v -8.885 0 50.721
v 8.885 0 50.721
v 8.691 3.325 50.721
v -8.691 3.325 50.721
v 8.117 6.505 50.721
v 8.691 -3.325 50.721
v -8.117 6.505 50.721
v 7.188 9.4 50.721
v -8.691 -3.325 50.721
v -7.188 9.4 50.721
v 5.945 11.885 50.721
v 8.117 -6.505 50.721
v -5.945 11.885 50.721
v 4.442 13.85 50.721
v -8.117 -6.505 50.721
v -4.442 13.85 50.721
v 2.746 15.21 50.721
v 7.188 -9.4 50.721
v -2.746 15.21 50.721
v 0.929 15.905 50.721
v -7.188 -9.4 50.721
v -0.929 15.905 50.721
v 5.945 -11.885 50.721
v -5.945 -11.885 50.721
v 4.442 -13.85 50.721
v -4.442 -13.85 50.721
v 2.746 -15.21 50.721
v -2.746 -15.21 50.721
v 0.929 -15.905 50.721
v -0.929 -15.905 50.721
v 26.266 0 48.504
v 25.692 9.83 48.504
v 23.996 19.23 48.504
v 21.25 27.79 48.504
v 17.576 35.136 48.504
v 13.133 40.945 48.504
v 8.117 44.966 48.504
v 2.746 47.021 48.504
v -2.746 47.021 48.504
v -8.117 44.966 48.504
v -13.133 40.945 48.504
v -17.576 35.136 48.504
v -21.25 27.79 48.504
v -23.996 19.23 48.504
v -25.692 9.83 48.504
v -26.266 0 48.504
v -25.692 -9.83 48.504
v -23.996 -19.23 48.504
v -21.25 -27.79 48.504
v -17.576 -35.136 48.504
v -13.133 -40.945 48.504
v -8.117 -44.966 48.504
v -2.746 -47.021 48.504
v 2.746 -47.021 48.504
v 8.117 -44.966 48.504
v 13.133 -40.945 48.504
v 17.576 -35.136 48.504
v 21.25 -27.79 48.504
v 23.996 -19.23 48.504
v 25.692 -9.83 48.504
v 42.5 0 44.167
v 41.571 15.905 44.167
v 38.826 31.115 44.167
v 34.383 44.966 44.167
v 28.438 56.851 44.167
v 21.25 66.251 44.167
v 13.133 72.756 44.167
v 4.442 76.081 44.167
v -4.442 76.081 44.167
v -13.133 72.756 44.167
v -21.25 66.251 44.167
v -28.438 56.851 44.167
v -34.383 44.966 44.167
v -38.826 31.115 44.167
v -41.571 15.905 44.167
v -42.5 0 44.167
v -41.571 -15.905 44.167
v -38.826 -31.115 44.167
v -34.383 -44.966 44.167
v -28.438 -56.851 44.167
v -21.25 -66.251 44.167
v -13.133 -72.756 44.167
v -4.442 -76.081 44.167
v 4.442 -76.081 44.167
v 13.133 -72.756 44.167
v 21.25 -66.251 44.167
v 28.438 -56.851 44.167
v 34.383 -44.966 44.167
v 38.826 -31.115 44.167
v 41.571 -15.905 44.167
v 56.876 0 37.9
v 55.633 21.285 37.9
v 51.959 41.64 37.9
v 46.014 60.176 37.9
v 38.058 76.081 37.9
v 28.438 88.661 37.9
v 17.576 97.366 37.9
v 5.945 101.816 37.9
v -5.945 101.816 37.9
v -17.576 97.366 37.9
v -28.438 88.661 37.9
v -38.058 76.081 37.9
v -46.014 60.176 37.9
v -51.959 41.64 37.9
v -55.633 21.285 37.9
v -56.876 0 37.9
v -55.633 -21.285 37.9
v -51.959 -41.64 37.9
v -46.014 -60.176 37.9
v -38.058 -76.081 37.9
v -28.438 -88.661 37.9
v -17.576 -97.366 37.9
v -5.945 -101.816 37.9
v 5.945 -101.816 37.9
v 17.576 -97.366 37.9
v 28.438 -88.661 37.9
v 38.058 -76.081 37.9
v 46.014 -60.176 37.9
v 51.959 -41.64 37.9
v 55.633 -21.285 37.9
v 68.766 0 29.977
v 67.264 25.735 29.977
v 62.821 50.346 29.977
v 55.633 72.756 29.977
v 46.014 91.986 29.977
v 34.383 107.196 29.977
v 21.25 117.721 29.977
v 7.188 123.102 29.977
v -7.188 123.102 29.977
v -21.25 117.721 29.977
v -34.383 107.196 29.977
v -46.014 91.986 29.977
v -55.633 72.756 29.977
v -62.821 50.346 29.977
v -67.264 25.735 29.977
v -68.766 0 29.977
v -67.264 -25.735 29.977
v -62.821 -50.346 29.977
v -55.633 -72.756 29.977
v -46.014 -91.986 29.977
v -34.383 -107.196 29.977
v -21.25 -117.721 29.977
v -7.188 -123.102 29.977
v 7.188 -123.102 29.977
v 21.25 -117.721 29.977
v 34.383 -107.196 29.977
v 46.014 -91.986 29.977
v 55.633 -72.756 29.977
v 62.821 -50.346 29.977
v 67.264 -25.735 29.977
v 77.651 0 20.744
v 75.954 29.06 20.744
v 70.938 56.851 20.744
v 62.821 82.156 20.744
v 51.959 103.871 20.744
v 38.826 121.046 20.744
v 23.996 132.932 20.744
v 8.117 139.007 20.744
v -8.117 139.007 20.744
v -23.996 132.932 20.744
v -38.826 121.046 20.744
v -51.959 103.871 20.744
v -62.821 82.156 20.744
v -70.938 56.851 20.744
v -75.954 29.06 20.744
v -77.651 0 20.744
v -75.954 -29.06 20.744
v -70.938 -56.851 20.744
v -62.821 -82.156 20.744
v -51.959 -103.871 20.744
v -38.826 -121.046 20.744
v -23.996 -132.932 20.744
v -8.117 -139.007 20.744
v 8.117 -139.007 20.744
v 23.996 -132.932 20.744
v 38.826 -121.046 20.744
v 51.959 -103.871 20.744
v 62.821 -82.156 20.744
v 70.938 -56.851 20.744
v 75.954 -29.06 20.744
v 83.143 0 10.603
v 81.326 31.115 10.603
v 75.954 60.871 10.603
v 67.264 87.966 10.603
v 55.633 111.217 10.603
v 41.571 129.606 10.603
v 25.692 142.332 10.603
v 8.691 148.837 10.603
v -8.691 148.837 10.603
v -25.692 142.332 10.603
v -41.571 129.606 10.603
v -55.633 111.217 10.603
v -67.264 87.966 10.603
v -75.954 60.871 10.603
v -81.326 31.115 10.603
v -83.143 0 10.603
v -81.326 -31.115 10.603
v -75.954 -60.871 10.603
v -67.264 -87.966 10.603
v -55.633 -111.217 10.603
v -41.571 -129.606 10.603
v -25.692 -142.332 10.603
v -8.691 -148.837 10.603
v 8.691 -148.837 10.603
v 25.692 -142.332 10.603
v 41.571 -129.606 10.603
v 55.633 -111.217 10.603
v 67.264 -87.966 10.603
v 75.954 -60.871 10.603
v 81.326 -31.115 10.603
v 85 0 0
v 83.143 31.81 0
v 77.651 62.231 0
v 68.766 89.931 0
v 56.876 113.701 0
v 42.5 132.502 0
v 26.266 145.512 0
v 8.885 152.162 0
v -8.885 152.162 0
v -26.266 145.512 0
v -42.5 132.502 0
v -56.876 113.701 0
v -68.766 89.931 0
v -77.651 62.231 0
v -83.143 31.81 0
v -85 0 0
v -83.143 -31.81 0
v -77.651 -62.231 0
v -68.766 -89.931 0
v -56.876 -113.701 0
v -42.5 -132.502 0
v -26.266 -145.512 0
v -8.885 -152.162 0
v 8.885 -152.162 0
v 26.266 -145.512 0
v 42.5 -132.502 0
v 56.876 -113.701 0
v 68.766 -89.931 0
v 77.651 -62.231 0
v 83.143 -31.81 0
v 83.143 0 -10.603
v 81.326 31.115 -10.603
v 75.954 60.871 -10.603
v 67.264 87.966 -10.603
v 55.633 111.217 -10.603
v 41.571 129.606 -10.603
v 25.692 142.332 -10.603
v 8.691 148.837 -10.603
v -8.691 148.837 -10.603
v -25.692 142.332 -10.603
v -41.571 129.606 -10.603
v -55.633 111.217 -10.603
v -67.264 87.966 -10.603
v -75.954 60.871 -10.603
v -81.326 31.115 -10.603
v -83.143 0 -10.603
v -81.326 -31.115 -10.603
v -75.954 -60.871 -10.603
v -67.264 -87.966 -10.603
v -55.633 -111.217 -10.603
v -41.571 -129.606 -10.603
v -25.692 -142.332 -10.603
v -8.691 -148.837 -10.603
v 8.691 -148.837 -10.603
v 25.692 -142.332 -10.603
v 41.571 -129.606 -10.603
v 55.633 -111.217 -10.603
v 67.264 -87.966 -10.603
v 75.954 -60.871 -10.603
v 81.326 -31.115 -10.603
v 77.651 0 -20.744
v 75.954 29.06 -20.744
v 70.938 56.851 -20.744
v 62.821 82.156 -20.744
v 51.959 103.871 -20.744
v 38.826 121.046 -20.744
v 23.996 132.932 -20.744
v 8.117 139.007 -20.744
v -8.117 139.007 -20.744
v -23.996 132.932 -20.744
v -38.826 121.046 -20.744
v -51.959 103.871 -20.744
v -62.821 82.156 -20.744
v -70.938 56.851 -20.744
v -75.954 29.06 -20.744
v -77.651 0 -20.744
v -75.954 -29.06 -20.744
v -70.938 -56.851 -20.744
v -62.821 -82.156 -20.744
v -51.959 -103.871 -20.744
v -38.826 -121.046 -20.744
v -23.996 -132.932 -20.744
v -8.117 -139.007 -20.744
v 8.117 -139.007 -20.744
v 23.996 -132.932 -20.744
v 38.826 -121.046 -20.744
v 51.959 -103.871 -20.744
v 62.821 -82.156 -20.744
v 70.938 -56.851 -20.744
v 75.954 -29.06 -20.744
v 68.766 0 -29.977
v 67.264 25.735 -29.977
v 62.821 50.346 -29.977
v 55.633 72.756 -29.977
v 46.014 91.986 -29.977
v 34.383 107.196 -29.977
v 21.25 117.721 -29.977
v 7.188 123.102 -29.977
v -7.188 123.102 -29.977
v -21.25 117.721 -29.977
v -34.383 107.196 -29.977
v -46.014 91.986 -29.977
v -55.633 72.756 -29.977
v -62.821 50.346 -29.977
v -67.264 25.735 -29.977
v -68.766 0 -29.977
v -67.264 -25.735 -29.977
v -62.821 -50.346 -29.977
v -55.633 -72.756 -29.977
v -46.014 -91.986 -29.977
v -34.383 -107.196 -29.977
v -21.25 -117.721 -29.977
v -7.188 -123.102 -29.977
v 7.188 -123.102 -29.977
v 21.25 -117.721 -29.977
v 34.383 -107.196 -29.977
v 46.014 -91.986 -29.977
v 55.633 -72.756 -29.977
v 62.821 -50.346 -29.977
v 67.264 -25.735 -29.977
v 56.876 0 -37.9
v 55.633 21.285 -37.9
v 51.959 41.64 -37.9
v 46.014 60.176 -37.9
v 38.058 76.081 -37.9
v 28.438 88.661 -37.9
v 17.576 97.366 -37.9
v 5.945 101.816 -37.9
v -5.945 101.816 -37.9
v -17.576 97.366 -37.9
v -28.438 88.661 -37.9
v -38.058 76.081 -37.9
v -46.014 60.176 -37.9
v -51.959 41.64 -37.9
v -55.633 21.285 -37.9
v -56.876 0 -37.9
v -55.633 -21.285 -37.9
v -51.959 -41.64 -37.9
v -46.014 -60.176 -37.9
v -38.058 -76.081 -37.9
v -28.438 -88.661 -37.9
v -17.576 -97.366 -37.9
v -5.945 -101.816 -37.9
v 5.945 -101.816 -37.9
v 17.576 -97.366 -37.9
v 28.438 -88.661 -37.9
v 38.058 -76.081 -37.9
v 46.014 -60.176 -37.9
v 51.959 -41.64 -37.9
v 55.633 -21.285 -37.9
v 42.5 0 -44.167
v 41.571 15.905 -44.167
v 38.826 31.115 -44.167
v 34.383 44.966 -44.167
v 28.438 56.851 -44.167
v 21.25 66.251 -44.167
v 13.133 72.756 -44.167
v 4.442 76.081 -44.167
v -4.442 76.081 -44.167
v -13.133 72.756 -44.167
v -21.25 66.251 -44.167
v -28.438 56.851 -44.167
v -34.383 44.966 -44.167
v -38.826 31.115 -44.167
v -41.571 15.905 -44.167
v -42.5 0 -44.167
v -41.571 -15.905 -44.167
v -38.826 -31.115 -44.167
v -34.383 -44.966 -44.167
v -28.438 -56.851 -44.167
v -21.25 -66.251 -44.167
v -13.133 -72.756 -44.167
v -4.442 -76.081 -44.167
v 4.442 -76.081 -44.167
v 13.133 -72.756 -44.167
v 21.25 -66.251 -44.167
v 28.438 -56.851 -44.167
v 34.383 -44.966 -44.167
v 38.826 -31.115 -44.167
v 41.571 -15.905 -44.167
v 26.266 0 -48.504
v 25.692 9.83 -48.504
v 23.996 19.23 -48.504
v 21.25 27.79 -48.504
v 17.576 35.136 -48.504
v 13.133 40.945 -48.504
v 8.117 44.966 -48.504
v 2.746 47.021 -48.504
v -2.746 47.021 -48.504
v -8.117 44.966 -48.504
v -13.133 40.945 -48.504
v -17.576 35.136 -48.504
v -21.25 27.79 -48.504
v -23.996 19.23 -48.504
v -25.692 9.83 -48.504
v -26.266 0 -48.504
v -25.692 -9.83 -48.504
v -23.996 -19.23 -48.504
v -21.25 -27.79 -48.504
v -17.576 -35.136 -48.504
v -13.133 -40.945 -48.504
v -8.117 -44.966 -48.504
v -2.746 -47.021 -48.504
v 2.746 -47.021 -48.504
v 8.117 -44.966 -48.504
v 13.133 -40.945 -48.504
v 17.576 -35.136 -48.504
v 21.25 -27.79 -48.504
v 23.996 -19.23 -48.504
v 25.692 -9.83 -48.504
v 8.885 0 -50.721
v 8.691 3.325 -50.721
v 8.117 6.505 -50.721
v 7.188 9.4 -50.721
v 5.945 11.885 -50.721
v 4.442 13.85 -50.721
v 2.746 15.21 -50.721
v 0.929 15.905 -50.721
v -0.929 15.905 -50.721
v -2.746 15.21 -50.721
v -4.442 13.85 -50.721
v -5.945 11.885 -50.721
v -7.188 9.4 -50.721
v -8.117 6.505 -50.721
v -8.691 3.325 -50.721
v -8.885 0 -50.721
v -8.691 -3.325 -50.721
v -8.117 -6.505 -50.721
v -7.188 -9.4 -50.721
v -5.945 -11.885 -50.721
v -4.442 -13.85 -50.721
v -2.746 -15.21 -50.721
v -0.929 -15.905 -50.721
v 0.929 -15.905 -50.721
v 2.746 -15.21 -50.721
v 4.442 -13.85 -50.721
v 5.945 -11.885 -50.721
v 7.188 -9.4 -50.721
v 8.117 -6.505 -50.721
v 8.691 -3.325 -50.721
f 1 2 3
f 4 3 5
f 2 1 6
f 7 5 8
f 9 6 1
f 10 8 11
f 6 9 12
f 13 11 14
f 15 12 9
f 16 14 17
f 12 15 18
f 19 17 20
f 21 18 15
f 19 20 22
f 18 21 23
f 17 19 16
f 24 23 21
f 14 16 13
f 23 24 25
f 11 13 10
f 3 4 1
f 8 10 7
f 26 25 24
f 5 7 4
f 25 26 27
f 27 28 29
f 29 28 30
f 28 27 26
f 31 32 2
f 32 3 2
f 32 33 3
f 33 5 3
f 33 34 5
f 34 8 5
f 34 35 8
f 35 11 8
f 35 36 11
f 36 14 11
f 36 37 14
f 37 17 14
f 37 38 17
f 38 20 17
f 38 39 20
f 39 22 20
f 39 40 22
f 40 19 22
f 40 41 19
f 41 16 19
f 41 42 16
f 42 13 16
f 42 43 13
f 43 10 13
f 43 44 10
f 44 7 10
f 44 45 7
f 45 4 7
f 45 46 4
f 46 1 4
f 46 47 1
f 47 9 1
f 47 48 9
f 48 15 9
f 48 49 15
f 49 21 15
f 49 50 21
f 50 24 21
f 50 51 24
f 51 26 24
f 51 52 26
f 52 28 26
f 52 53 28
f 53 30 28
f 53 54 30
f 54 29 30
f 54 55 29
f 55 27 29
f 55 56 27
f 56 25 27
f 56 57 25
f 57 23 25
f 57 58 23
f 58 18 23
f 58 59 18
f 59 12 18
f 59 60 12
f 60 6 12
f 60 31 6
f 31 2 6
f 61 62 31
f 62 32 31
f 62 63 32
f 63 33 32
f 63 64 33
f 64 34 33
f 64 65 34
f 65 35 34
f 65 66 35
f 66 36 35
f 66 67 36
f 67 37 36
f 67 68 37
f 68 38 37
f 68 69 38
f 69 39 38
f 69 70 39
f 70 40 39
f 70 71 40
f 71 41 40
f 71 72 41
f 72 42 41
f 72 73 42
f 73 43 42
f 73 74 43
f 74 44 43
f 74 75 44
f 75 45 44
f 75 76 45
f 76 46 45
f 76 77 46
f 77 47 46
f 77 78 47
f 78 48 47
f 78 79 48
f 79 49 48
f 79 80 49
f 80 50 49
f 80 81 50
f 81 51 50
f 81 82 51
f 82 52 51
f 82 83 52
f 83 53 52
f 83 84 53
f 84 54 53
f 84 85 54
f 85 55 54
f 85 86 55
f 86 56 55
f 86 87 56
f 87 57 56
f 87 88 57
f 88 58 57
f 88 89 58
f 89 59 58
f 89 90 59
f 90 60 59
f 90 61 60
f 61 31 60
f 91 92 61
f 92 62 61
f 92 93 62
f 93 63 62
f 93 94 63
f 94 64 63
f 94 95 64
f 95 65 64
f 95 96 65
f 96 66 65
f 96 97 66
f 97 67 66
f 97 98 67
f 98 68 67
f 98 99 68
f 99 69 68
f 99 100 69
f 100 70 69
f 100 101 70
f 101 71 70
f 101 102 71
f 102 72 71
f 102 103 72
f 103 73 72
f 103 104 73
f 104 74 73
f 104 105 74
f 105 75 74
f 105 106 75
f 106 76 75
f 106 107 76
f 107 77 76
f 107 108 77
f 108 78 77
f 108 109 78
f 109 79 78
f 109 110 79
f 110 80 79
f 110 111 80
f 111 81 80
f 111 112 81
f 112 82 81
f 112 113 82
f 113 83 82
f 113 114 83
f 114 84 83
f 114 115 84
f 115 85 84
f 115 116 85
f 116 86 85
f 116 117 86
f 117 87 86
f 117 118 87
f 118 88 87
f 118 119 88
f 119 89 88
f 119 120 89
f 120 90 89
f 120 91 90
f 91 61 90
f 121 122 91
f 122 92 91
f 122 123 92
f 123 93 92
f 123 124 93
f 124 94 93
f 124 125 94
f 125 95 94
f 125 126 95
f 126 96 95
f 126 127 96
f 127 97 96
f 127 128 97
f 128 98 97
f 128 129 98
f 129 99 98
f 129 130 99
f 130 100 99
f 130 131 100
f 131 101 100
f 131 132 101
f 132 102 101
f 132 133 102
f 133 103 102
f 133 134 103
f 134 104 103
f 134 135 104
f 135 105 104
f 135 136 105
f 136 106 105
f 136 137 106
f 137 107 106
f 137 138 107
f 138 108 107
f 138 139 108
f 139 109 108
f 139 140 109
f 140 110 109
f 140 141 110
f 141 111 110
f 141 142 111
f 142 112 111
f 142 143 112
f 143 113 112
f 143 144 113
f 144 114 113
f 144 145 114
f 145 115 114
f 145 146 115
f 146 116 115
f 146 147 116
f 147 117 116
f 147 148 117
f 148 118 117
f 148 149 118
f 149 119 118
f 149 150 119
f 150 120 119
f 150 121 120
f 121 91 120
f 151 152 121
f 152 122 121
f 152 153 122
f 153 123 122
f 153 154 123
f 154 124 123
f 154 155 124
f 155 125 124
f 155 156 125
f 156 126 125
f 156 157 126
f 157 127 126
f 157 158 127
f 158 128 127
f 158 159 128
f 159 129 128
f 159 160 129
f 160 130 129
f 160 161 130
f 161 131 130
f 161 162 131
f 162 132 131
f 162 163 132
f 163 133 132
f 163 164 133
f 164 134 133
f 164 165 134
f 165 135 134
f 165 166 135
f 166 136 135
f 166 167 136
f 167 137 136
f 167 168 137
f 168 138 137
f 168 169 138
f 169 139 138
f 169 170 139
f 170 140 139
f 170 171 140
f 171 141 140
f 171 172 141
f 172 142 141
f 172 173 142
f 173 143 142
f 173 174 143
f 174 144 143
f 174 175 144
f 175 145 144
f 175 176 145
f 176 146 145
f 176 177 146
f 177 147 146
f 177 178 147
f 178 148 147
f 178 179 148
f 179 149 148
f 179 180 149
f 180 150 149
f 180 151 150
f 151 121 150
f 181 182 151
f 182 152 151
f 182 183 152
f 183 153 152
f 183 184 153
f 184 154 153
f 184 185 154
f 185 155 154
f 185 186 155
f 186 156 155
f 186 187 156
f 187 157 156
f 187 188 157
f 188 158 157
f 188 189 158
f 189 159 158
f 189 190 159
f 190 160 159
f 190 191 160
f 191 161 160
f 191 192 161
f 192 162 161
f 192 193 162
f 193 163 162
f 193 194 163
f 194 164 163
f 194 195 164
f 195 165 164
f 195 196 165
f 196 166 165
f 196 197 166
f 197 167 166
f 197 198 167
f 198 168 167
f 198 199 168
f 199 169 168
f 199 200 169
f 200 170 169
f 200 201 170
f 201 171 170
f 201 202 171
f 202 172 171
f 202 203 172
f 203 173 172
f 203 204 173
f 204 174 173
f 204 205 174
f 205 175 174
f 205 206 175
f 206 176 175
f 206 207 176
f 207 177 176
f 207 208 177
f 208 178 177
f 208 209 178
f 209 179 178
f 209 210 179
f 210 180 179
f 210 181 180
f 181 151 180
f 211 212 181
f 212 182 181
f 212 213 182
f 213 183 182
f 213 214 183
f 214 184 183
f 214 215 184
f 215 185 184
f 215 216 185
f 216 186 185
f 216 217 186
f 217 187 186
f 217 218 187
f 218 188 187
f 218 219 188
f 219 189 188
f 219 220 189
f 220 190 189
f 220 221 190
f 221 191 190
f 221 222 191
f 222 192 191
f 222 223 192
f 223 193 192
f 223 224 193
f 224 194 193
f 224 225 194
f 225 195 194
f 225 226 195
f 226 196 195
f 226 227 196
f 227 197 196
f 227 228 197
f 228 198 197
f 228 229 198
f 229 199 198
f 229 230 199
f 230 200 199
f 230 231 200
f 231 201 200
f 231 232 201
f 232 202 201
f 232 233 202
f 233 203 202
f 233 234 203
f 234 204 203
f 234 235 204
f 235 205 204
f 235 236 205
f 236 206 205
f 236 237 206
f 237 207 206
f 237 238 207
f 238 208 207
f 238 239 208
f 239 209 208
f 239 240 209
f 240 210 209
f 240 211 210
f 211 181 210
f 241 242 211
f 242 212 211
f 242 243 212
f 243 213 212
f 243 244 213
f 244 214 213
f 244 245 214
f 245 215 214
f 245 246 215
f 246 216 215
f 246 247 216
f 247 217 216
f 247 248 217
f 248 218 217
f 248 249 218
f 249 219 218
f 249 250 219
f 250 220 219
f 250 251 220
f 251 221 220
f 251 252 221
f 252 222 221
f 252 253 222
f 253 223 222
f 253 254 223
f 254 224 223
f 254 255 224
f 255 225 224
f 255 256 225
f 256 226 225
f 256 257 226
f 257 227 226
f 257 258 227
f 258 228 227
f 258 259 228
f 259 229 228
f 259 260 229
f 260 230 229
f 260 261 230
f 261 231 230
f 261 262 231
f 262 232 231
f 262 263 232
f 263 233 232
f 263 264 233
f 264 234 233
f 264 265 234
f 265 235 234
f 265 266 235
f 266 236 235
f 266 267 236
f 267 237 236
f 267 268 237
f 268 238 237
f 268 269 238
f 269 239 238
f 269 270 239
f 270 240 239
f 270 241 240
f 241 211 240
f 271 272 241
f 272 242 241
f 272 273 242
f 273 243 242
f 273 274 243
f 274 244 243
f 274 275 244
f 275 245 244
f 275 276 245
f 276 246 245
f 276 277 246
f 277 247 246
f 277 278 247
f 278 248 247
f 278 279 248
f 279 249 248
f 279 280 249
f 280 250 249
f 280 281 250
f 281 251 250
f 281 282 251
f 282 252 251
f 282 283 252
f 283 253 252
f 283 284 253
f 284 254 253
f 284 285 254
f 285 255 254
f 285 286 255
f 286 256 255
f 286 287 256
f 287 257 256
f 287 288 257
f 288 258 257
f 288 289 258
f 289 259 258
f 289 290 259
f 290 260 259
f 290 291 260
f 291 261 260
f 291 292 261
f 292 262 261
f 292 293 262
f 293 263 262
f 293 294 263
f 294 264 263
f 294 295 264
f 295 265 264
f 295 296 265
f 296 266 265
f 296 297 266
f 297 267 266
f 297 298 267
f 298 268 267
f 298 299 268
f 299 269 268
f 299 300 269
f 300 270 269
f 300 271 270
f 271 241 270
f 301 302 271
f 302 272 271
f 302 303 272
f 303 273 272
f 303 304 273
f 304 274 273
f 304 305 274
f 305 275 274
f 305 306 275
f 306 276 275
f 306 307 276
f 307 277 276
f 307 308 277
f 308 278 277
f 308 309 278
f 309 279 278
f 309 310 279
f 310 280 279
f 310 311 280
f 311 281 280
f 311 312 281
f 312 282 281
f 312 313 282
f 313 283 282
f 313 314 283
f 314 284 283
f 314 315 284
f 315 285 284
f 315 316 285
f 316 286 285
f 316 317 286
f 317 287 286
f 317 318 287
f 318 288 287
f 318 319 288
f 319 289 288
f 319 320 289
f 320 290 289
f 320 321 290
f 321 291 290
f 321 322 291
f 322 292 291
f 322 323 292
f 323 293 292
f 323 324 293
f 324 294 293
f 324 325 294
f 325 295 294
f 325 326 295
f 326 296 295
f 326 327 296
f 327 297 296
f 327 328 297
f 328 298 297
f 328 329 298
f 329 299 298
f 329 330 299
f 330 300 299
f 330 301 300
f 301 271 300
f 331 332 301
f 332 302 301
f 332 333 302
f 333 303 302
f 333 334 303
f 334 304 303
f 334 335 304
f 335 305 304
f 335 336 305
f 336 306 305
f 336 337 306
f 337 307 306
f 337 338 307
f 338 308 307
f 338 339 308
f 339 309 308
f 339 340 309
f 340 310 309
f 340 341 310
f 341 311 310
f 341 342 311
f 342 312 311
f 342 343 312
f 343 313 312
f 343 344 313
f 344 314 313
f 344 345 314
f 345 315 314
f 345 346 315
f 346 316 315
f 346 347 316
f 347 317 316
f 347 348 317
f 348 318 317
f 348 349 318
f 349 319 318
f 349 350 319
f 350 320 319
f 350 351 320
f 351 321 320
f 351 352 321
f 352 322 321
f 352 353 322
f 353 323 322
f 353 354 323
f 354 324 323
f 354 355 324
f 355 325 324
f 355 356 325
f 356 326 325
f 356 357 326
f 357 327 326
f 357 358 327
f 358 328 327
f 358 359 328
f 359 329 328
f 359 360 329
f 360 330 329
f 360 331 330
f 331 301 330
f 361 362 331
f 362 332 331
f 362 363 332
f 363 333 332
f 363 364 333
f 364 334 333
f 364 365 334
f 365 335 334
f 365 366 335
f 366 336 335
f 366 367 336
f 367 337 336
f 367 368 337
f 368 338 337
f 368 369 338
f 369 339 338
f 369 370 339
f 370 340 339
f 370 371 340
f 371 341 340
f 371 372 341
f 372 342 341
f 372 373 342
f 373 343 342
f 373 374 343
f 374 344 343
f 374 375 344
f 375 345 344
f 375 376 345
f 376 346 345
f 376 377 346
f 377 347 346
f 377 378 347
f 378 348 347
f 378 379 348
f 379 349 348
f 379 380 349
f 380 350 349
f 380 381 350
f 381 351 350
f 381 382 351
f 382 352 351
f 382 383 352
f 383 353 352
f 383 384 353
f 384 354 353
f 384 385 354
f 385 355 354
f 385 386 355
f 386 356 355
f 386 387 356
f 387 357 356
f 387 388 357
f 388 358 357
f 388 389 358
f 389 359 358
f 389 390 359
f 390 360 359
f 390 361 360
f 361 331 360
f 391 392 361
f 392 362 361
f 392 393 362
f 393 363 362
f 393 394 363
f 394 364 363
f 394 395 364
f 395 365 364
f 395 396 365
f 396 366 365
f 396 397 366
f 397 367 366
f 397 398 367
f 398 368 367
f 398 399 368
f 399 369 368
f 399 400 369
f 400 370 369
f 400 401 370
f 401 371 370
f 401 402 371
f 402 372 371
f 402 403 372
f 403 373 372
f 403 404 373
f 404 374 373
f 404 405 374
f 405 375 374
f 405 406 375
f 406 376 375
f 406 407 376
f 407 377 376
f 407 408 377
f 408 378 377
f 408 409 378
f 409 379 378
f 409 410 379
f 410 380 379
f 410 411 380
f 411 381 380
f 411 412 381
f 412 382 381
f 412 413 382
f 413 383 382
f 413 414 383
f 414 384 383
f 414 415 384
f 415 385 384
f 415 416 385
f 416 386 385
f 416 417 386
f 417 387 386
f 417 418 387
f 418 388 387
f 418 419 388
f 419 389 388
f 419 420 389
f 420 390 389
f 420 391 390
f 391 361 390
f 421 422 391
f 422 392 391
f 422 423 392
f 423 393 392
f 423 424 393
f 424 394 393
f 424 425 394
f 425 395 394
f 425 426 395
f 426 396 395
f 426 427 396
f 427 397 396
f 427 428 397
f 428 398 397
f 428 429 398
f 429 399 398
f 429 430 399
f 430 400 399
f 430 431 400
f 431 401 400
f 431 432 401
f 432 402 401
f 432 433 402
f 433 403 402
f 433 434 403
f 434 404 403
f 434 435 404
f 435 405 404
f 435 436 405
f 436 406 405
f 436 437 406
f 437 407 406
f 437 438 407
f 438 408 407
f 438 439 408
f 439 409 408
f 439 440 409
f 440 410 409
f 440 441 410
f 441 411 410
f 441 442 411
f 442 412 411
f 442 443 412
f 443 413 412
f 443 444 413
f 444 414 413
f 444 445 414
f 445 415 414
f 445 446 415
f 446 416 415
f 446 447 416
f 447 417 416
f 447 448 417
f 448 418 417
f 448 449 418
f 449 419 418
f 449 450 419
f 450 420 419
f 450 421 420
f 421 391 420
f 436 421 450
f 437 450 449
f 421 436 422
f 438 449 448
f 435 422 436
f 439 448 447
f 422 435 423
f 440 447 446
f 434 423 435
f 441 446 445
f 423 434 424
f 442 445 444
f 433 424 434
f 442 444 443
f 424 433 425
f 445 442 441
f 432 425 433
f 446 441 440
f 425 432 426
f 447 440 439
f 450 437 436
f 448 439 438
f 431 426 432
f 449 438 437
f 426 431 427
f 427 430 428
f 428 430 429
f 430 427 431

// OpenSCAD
// Generated by SolidPython 1.0.1 on 2020-07-29 00:46:46


scale(v = [5, 9, 3]) {
	sphere(r = 17);
}
/***********************************************
*********      SolidPython code:      **********
************************************************
 
# import packages: SolidPython
from solid import *
from solid.utils import *
from itertools import chain, combinations, permutations


class Resize:

    def __init__(self, scad_file):
        self.scad_file = scad_file
        #self.scad_file = import_scad(scad_file)
        # cone/cylinder param:
        self.r1 = 0
        self.r2 = 0
        self.h = 0
        # rectangular prism param:
        self.w = 0
        self.l = 0
        # ellipse param:
        self.r = 0

    # import OpenScad code (file name corresponds to shape)


    # classify shape + parameters
    def assign(self, param1, param2, param3):
        if self.scad_file == 'cone.scad':
            self.r1 = param1
            self.r2 = param2
            self.h = param3
        elif self.scad_file == 'cylinder.scad':
            self.r1 = param1
            self.r2 = param2
            self.h = param3
        elif self.scad_file == 'rectangularPrism.scad':
            self.h = param1
            self.l = param2
            self.w = param3
        else:
            self.r = param1
            self.h = param2

    # resize parameters
    def iterate(self):
        x = range(3, 20, 2)
        i = 1
        if self.scad_file == 'cone.scad':
            tempList = list(permutations(x, 2))
            for temp in tempList:
                param1 = temp[0]
                param2 = temp[1]
                filepath = 'produced_scad_files/' + 'cone' + str(param1) + '_' + str(param2) + '_' + '.scad'
                scad_render_to_file(cylinder(h=param1, r1=param2, r2=0), filepath)

        elif self.scad_file == 'cylinder.scad':
            tempList = list(permutations(x, 3))
            for temp in tempList:
                param1 = temp[0]
                param2 = temp[1]
                filepath = 'produced_scad_files/' + 'cylinder' + str(param1) + '_' + str(param2) + '_' + '.scad'
                scad_render_to_file(cylinder(h=param1, r1=param2, r2=param2), filepath)

        elif self.scad_file == 'rectangularPrism.scad':
            tempList = list(permutations(x, 3))
            for temp in tempList:
                param1 = temp[0]
                param2 = temp[1]
                param3 = temp[2]
                filepath = 'produced_scad_files/' + 'rectangularPrism' + str(param1) + '_' + str(param2) + '_' + str(
                    param3) + '.scad'
                scad_render_to_file(cube(size=(param1, param2, param3)), filepath)

        elif self.scad_file == 'ellipse.scad':
            tempList = list(permutations(x, 4))
            for temp in tempList:
                param1 = temp[0]
                param2 = temp[1]
                param3 = temp[2]
                param4 = temp[3]
                filepath = 'produced_scad_files/' + 'ellipse' + str(param1) + '_' + str(param2) + '_' + str(param3) + '_' + str(param4) + '.scad'
                scad_render_to_file(scale([param1, param2, param3])(sphere(r=param4)), filepath)

    def render_to_scadfile(self):
        scad_render_to_file(scad, 'example.scad') 
 
************************************************/
